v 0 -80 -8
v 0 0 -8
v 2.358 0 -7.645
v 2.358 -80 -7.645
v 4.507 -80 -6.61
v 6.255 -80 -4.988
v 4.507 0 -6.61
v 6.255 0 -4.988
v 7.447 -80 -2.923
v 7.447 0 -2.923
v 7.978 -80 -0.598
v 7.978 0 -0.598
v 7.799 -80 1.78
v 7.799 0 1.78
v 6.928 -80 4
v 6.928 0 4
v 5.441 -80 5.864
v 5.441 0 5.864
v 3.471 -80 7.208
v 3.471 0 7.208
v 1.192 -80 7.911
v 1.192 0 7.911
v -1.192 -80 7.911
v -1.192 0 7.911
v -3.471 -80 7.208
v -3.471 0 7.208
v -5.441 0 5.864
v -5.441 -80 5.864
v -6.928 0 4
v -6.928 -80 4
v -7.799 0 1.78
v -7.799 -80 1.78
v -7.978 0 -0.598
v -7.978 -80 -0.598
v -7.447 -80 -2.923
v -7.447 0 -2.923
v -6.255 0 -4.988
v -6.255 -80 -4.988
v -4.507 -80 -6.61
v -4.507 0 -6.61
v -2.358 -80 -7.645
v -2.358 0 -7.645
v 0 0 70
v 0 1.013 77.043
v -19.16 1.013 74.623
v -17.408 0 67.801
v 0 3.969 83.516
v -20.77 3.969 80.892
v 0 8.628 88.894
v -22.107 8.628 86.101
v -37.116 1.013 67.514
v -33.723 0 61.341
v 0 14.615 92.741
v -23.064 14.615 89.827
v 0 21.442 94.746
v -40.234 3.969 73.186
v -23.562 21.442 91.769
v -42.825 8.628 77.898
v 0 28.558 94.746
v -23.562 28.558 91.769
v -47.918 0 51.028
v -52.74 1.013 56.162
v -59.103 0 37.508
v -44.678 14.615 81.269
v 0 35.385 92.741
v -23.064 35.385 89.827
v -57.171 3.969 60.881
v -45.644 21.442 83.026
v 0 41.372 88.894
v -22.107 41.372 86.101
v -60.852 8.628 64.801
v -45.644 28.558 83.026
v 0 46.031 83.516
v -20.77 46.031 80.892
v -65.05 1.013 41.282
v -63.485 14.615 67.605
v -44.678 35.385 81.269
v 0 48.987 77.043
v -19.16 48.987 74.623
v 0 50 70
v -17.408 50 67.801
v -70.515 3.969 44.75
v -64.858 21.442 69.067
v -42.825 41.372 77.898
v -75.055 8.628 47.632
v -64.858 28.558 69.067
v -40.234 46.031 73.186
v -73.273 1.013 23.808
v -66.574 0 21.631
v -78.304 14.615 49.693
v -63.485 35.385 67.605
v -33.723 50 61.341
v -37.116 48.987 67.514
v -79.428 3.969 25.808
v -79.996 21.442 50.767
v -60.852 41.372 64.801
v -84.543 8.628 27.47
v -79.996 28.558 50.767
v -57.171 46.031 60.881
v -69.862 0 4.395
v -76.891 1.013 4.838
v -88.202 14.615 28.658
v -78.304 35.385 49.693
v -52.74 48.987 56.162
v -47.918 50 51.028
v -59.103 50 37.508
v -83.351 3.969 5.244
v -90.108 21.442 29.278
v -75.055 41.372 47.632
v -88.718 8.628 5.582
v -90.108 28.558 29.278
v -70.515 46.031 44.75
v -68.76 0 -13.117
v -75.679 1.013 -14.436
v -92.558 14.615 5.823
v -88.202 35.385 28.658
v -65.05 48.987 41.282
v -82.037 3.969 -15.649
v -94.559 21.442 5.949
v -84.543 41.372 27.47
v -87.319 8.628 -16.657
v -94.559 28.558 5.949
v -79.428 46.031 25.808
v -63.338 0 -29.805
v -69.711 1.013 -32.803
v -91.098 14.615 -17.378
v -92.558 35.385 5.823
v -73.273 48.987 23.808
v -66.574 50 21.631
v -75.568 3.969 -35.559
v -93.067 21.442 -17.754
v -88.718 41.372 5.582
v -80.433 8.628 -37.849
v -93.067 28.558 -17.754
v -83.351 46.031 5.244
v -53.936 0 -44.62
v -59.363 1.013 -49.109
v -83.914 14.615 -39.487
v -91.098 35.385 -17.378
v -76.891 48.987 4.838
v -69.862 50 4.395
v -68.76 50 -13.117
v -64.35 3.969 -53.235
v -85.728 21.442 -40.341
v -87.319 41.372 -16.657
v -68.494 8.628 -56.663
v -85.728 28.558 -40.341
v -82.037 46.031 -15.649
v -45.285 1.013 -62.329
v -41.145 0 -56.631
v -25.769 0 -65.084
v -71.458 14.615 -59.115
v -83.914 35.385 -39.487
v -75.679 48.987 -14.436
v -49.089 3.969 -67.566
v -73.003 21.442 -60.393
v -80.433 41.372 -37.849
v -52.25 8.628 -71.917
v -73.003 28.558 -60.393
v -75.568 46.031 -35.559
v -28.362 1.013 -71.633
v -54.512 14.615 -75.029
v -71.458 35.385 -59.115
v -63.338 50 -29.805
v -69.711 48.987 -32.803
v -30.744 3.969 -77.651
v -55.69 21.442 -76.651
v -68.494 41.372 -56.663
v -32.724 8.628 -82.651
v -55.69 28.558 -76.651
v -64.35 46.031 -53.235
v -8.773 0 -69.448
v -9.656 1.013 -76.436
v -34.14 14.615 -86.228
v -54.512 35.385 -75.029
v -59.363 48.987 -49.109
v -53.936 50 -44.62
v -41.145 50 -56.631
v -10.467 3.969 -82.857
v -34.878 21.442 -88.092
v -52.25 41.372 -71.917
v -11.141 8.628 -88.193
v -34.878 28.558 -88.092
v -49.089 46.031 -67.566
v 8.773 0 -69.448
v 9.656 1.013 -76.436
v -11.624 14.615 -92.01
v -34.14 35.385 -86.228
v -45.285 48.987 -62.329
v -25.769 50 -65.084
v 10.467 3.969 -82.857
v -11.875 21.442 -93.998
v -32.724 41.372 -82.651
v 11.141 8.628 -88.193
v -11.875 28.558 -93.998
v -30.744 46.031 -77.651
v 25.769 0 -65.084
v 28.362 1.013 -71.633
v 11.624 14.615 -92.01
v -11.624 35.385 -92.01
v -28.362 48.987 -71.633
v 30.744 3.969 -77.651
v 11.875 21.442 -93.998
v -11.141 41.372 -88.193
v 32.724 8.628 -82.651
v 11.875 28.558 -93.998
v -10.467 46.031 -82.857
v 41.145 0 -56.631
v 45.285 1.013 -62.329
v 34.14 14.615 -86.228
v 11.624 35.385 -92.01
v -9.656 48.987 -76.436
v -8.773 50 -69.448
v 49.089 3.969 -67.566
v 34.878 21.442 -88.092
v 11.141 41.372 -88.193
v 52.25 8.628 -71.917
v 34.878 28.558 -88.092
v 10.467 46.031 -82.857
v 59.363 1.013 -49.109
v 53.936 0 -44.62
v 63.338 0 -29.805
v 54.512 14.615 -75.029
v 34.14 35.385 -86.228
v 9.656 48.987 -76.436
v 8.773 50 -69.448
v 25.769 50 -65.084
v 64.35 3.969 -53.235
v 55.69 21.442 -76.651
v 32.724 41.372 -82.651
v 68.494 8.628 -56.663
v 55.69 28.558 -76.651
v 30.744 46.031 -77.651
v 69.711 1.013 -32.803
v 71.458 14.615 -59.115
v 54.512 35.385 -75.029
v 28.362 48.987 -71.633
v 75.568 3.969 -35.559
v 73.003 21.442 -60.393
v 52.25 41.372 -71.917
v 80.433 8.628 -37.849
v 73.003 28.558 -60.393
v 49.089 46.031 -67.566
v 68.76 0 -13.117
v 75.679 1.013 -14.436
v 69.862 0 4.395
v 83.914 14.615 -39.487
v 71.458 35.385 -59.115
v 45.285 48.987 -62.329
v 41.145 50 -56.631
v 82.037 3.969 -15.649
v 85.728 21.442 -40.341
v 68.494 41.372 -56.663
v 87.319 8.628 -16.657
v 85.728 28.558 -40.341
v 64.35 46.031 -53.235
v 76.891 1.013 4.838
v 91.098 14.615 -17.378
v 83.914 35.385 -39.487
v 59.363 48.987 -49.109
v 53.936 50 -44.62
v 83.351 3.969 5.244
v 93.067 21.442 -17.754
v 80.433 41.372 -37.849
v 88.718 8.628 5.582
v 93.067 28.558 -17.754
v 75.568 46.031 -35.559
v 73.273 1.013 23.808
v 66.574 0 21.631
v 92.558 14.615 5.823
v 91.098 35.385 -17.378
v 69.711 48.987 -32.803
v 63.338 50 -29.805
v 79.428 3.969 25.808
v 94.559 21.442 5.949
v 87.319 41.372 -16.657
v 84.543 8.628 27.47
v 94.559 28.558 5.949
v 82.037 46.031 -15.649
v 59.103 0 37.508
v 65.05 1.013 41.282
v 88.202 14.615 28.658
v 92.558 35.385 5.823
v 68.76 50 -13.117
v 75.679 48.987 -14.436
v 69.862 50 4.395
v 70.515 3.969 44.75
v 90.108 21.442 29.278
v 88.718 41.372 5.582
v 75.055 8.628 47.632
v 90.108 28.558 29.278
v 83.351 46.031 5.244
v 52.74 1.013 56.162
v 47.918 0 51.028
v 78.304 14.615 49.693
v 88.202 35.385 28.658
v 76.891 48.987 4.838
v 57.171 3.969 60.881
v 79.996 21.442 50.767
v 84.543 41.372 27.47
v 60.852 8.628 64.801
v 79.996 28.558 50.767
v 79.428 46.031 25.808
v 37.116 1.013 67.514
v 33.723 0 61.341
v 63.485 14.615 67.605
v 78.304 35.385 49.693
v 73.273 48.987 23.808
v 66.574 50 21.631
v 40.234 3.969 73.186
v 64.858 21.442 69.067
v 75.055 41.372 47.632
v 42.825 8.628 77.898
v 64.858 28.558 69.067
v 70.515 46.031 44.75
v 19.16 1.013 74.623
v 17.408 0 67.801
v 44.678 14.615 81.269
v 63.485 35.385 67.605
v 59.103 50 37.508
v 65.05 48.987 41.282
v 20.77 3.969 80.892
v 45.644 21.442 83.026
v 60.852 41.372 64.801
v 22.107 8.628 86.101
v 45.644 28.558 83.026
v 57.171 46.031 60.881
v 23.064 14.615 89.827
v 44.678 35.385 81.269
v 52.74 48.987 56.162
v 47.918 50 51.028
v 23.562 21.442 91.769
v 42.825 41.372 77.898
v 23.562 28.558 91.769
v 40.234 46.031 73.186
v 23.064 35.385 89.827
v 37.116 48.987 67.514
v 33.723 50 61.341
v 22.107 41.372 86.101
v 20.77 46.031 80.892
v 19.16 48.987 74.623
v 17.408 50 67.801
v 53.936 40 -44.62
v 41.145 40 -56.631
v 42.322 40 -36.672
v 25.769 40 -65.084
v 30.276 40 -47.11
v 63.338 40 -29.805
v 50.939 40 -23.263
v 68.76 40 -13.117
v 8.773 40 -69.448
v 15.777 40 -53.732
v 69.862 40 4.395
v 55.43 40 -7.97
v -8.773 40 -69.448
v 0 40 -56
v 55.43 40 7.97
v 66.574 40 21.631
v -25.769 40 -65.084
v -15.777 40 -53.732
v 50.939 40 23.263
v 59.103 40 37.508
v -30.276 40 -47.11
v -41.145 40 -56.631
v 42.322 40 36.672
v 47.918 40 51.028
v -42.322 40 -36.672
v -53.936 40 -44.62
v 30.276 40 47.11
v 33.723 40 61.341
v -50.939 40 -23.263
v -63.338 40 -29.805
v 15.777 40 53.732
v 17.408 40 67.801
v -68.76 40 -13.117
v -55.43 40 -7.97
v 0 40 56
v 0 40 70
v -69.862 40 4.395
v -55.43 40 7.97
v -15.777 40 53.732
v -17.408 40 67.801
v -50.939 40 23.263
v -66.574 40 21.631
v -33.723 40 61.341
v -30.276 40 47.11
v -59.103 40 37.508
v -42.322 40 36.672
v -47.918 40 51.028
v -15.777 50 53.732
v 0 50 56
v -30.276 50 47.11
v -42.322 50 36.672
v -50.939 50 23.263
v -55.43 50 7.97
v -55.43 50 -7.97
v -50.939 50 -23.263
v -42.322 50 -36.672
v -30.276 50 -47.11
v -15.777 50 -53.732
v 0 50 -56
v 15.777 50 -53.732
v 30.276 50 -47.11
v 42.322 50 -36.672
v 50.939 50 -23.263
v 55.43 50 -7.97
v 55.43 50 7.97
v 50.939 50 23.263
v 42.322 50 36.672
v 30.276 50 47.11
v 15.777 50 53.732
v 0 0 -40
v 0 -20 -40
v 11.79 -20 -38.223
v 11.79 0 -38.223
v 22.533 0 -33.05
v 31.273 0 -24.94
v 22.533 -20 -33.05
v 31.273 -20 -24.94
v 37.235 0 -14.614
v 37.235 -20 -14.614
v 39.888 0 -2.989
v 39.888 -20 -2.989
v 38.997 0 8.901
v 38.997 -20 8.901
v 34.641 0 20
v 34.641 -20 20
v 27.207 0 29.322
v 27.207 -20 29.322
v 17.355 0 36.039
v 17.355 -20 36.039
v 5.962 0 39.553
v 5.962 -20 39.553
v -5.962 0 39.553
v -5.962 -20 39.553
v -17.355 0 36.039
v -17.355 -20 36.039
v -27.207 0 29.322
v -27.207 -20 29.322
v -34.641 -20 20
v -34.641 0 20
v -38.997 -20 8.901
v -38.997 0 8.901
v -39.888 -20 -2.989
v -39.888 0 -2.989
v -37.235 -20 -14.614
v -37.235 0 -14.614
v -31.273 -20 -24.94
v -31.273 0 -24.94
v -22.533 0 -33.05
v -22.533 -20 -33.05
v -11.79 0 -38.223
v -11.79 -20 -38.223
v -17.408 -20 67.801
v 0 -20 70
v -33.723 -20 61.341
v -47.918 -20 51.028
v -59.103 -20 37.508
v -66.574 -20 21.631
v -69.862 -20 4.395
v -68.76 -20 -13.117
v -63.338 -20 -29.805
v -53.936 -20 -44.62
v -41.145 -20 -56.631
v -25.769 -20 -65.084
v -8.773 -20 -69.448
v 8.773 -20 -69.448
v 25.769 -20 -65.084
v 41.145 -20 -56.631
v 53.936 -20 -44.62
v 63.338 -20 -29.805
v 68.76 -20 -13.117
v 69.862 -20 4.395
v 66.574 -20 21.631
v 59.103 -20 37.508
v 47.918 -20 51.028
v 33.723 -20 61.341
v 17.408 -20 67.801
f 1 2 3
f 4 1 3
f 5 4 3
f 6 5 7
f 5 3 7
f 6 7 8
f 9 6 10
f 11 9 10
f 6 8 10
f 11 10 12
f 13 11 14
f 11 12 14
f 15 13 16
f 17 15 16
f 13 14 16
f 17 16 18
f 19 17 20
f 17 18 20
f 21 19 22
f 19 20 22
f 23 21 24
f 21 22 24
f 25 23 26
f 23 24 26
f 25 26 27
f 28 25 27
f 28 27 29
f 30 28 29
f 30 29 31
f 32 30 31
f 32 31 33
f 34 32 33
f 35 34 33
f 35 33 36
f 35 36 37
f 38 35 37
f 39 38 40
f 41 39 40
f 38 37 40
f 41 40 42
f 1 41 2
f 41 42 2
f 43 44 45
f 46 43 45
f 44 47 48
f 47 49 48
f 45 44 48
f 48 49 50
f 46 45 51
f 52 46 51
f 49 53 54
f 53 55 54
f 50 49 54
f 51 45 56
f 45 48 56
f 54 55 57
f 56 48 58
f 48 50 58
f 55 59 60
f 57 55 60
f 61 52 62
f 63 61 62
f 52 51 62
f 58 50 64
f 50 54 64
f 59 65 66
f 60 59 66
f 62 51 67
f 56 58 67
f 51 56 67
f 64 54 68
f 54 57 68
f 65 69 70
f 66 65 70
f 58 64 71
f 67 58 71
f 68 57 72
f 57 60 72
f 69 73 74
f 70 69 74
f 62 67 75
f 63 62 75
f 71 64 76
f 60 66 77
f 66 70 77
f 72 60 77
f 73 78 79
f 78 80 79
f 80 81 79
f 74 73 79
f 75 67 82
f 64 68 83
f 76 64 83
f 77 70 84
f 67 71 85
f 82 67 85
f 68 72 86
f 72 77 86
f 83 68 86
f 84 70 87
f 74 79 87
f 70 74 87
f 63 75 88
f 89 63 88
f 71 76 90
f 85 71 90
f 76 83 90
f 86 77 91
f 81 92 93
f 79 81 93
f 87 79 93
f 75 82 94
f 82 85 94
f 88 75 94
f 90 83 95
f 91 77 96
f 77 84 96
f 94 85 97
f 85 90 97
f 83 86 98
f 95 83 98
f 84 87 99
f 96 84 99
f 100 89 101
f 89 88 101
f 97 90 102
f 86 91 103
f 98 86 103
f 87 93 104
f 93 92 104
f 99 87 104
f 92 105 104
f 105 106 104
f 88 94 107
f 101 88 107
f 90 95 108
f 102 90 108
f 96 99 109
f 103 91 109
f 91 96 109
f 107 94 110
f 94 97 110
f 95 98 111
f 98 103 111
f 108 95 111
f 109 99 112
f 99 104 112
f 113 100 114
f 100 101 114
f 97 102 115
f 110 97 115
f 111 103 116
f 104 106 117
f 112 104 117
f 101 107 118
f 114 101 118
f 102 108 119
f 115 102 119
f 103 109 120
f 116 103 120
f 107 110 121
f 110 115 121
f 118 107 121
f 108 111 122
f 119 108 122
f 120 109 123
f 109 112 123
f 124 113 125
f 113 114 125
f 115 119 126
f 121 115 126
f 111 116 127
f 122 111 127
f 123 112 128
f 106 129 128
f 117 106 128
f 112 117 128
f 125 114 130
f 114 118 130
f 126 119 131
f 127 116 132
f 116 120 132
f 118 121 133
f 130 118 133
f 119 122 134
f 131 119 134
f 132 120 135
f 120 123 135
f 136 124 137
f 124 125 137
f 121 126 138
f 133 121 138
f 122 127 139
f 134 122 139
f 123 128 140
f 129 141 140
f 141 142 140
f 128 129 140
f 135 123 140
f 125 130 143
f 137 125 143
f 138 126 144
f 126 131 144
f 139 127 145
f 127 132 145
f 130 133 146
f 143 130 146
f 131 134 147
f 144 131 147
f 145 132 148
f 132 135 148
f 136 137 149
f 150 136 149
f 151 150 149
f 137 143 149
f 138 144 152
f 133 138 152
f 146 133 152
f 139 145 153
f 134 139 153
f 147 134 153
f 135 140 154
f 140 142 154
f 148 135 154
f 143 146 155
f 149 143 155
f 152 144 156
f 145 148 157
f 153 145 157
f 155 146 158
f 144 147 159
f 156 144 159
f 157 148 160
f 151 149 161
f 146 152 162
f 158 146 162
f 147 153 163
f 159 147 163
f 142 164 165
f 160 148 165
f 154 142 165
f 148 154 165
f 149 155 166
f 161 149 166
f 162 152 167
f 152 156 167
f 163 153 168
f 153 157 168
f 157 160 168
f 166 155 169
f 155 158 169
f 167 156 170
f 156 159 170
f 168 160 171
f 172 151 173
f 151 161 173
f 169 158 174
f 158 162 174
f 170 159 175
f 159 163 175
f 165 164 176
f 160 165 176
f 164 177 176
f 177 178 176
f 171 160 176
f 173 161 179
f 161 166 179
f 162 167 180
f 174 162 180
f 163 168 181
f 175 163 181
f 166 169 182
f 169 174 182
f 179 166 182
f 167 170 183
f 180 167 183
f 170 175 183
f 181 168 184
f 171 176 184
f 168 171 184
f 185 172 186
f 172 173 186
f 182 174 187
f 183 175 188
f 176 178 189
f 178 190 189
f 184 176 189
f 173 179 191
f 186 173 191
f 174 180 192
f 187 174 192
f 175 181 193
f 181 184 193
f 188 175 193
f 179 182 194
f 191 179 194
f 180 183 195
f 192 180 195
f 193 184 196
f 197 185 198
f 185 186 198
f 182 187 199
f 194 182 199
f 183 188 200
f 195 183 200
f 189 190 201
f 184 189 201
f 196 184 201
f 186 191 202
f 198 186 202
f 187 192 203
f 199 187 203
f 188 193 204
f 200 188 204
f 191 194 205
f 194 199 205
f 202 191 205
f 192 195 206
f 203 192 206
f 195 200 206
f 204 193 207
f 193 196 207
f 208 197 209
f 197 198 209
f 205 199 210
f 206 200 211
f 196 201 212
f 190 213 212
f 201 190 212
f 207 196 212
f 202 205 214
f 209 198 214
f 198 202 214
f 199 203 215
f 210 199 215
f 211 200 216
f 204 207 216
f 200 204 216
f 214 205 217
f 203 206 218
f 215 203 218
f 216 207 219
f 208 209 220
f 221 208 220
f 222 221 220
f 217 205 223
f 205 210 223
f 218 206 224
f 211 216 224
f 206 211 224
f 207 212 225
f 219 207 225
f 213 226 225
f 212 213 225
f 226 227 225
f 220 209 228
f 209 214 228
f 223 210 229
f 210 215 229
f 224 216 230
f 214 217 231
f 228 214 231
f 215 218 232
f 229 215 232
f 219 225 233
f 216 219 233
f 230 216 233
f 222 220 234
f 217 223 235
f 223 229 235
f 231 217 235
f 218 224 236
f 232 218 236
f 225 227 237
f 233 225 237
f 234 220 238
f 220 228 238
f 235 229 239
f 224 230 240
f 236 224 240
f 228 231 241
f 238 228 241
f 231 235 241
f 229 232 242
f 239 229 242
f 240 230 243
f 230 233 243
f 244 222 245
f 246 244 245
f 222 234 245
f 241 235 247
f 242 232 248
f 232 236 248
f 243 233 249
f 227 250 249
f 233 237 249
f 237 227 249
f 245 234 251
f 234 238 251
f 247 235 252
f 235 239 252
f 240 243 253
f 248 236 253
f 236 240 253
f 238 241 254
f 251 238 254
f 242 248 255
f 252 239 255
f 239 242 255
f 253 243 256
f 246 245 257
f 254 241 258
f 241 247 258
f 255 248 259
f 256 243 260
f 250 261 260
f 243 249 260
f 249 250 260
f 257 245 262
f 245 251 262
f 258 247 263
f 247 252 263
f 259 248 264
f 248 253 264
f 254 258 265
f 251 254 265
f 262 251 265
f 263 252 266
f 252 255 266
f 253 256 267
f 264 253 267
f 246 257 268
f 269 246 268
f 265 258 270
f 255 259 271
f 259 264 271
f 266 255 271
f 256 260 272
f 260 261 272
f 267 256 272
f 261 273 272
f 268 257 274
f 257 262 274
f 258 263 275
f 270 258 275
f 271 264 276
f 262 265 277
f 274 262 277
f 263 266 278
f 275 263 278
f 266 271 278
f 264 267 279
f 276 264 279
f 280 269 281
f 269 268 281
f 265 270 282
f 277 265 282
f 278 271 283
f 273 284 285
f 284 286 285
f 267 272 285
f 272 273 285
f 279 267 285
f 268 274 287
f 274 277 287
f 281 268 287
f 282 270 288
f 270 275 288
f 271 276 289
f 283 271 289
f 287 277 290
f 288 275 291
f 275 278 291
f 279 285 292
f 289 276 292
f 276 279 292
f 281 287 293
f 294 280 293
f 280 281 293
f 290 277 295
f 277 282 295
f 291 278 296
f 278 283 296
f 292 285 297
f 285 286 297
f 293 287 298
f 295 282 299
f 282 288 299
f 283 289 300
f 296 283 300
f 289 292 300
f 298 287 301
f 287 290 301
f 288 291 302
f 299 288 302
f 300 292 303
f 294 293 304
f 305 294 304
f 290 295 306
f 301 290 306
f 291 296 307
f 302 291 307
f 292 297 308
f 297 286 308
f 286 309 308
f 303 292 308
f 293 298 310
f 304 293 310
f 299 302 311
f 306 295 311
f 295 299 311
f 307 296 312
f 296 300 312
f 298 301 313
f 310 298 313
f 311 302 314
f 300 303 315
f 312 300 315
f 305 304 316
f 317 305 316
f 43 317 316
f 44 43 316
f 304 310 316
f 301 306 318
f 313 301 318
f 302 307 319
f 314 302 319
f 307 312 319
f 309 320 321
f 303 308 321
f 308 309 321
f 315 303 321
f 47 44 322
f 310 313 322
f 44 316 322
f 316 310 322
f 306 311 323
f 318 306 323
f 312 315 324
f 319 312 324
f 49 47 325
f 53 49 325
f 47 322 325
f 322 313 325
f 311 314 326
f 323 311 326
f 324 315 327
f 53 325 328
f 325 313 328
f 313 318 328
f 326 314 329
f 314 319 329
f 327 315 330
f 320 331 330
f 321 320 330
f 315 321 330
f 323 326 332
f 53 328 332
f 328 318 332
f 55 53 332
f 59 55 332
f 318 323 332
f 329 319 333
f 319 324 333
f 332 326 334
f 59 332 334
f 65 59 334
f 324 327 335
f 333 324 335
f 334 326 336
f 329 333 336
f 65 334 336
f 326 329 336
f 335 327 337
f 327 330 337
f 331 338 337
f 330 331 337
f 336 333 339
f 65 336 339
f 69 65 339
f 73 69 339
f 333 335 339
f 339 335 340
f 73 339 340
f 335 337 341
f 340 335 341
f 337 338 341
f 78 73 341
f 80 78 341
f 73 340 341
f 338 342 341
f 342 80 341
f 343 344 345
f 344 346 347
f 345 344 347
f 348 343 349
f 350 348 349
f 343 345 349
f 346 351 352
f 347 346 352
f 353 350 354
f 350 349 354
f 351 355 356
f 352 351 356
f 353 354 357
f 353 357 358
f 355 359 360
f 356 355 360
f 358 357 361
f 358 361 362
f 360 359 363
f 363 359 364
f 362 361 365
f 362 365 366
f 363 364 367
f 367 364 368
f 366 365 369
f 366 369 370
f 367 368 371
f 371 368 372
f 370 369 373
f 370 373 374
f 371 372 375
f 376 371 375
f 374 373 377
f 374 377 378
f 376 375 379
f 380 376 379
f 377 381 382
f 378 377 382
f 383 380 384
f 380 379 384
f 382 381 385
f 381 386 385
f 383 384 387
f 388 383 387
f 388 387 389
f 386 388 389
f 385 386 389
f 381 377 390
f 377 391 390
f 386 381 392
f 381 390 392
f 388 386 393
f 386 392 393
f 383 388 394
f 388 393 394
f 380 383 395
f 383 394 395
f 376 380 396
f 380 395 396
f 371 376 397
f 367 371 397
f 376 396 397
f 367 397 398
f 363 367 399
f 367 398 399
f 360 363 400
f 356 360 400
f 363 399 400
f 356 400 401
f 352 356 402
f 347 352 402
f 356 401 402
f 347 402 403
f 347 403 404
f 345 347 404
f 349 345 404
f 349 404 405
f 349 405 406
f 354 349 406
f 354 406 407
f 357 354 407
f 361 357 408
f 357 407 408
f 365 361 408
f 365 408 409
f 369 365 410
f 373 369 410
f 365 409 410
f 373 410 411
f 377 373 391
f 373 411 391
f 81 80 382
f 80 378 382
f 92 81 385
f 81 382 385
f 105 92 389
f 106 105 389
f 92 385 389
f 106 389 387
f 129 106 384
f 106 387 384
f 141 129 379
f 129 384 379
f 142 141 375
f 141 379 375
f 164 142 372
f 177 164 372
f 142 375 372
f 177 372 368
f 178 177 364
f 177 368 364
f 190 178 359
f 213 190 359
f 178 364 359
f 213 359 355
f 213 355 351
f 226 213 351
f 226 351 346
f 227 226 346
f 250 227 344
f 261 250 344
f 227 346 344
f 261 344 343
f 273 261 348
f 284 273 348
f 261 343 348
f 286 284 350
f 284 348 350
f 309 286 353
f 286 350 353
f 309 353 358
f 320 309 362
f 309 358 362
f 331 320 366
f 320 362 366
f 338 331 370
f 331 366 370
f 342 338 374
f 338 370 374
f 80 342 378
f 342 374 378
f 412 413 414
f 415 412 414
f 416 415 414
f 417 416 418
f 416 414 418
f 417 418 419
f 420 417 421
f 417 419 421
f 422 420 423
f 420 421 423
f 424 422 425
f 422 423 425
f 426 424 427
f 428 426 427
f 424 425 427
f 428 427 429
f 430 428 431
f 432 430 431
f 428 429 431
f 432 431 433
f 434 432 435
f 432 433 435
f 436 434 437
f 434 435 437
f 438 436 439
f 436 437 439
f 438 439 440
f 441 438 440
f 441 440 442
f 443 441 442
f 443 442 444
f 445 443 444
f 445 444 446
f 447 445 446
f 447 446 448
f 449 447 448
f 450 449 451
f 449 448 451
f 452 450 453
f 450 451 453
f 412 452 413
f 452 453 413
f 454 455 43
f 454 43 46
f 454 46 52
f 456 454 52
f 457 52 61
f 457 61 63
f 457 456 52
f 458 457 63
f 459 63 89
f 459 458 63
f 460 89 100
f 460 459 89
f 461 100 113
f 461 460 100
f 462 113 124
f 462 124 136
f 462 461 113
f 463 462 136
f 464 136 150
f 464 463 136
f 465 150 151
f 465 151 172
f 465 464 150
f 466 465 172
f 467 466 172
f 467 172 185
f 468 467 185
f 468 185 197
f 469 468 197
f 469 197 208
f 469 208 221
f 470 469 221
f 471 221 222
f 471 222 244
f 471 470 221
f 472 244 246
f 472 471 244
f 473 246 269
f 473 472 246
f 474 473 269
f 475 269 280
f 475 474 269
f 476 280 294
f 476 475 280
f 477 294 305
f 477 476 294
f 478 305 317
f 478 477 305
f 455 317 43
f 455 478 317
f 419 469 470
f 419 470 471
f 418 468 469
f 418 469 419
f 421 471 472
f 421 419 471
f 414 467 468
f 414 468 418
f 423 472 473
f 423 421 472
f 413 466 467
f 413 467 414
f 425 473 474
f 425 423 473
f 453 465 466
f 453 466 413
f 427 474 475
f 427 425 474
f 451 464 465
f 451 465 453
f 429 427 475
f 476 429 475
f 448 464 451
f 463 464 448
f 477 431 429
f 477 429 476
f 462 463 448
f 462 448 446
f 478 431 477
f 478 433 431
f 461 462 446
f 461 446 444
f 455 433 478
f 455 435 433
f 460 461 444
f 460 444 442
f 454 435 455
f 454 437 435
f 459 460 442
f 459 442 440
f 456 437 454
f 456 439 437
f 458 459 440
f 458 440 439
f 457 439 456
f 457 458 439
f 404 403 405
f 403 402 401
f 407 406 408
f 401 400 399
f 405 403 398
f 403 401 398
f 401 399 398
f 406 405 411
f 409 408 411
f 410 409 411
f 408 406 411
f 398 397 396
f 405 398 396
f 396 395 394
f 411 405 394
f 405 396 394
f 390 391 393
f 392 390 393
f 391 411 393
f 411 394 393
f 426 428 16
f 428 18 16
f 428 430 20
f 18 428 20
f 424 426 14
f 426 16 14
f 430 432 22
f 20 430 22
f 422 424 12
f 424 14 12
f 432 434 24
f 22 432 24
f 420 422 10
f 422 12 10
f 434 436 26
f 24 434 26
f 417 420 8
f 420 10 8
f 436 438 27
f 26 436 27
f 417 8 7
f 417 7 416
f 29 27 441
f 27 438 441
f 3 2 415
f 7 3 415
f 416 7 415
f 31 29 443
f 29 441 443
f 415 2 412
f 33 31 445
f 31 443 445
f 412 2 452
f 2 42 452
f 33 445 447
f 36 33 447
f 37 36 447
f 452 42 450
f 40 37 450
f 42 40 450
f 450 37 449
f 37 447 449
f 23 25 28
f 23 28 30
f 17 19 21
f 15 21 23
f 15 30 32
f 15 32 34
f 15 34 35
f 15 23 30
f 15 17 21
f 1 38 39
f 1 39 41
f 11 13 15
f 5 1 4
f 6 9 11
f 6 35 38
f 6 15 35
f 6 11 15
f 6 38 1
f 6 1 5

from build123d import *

# Parameters (mm, degrees)
BOSS_EXTRUDE2_START = 20
SKETCH3_R           = 70
SKETCH3_R_2         = 40
BOSS_EXTRUDE2_DEPTH = 20
SKETCH4_R           = 8
BOSS_EXTRUDE3_DEPTH = 80


with BuildPart() as part:
    # Sketch2 → Revolve1 (revolve)
    with BuildSketch(Plane.YZ):
        with BuildLine():
            Line((0, 0), (0, 70))
            ThreePointArc((0, 70), (25, 95), (50, 70))
            Line((50, 70), (40, 70))
            Line((40, 70), (40, 56))
            Line((40, 56), (50, 56))
            Line((50, 56), (50, 0))
            Line((50, 0), (0, 0))
        make_face()
    revolve(axis=Axis((0, 50, 0), (0, -1, 0)))

    # Sketch3 → Boss-Extrude2 (add)
    with BuildSketch(Plane.XZ.offset(BOSS_EXTRUDE2_START)):
        with Locations(Location((0, 0, 0), (0, 0, 90))):
            Circle(SKETCH3_R)
        with Locations(Location((0, 0, 0), (0, 0, 270))):
            Circle(SKETCH3_R_2, mode=Mode.SUBTRACT)
    extrude(amount=-BOSS_EXTRUDE2_DEPTH)

    # Sketch4 → Boss-Extrude3 (add)
    with BuildSketch(Plane.XZ):
        with Locations(Location((0, 0, 0), (0, 0, 270))):
            Circle(SKETCH4_R)
    extrude(amount=BOSS_EXTRUDE3_DEPTH)


solid = part.part
